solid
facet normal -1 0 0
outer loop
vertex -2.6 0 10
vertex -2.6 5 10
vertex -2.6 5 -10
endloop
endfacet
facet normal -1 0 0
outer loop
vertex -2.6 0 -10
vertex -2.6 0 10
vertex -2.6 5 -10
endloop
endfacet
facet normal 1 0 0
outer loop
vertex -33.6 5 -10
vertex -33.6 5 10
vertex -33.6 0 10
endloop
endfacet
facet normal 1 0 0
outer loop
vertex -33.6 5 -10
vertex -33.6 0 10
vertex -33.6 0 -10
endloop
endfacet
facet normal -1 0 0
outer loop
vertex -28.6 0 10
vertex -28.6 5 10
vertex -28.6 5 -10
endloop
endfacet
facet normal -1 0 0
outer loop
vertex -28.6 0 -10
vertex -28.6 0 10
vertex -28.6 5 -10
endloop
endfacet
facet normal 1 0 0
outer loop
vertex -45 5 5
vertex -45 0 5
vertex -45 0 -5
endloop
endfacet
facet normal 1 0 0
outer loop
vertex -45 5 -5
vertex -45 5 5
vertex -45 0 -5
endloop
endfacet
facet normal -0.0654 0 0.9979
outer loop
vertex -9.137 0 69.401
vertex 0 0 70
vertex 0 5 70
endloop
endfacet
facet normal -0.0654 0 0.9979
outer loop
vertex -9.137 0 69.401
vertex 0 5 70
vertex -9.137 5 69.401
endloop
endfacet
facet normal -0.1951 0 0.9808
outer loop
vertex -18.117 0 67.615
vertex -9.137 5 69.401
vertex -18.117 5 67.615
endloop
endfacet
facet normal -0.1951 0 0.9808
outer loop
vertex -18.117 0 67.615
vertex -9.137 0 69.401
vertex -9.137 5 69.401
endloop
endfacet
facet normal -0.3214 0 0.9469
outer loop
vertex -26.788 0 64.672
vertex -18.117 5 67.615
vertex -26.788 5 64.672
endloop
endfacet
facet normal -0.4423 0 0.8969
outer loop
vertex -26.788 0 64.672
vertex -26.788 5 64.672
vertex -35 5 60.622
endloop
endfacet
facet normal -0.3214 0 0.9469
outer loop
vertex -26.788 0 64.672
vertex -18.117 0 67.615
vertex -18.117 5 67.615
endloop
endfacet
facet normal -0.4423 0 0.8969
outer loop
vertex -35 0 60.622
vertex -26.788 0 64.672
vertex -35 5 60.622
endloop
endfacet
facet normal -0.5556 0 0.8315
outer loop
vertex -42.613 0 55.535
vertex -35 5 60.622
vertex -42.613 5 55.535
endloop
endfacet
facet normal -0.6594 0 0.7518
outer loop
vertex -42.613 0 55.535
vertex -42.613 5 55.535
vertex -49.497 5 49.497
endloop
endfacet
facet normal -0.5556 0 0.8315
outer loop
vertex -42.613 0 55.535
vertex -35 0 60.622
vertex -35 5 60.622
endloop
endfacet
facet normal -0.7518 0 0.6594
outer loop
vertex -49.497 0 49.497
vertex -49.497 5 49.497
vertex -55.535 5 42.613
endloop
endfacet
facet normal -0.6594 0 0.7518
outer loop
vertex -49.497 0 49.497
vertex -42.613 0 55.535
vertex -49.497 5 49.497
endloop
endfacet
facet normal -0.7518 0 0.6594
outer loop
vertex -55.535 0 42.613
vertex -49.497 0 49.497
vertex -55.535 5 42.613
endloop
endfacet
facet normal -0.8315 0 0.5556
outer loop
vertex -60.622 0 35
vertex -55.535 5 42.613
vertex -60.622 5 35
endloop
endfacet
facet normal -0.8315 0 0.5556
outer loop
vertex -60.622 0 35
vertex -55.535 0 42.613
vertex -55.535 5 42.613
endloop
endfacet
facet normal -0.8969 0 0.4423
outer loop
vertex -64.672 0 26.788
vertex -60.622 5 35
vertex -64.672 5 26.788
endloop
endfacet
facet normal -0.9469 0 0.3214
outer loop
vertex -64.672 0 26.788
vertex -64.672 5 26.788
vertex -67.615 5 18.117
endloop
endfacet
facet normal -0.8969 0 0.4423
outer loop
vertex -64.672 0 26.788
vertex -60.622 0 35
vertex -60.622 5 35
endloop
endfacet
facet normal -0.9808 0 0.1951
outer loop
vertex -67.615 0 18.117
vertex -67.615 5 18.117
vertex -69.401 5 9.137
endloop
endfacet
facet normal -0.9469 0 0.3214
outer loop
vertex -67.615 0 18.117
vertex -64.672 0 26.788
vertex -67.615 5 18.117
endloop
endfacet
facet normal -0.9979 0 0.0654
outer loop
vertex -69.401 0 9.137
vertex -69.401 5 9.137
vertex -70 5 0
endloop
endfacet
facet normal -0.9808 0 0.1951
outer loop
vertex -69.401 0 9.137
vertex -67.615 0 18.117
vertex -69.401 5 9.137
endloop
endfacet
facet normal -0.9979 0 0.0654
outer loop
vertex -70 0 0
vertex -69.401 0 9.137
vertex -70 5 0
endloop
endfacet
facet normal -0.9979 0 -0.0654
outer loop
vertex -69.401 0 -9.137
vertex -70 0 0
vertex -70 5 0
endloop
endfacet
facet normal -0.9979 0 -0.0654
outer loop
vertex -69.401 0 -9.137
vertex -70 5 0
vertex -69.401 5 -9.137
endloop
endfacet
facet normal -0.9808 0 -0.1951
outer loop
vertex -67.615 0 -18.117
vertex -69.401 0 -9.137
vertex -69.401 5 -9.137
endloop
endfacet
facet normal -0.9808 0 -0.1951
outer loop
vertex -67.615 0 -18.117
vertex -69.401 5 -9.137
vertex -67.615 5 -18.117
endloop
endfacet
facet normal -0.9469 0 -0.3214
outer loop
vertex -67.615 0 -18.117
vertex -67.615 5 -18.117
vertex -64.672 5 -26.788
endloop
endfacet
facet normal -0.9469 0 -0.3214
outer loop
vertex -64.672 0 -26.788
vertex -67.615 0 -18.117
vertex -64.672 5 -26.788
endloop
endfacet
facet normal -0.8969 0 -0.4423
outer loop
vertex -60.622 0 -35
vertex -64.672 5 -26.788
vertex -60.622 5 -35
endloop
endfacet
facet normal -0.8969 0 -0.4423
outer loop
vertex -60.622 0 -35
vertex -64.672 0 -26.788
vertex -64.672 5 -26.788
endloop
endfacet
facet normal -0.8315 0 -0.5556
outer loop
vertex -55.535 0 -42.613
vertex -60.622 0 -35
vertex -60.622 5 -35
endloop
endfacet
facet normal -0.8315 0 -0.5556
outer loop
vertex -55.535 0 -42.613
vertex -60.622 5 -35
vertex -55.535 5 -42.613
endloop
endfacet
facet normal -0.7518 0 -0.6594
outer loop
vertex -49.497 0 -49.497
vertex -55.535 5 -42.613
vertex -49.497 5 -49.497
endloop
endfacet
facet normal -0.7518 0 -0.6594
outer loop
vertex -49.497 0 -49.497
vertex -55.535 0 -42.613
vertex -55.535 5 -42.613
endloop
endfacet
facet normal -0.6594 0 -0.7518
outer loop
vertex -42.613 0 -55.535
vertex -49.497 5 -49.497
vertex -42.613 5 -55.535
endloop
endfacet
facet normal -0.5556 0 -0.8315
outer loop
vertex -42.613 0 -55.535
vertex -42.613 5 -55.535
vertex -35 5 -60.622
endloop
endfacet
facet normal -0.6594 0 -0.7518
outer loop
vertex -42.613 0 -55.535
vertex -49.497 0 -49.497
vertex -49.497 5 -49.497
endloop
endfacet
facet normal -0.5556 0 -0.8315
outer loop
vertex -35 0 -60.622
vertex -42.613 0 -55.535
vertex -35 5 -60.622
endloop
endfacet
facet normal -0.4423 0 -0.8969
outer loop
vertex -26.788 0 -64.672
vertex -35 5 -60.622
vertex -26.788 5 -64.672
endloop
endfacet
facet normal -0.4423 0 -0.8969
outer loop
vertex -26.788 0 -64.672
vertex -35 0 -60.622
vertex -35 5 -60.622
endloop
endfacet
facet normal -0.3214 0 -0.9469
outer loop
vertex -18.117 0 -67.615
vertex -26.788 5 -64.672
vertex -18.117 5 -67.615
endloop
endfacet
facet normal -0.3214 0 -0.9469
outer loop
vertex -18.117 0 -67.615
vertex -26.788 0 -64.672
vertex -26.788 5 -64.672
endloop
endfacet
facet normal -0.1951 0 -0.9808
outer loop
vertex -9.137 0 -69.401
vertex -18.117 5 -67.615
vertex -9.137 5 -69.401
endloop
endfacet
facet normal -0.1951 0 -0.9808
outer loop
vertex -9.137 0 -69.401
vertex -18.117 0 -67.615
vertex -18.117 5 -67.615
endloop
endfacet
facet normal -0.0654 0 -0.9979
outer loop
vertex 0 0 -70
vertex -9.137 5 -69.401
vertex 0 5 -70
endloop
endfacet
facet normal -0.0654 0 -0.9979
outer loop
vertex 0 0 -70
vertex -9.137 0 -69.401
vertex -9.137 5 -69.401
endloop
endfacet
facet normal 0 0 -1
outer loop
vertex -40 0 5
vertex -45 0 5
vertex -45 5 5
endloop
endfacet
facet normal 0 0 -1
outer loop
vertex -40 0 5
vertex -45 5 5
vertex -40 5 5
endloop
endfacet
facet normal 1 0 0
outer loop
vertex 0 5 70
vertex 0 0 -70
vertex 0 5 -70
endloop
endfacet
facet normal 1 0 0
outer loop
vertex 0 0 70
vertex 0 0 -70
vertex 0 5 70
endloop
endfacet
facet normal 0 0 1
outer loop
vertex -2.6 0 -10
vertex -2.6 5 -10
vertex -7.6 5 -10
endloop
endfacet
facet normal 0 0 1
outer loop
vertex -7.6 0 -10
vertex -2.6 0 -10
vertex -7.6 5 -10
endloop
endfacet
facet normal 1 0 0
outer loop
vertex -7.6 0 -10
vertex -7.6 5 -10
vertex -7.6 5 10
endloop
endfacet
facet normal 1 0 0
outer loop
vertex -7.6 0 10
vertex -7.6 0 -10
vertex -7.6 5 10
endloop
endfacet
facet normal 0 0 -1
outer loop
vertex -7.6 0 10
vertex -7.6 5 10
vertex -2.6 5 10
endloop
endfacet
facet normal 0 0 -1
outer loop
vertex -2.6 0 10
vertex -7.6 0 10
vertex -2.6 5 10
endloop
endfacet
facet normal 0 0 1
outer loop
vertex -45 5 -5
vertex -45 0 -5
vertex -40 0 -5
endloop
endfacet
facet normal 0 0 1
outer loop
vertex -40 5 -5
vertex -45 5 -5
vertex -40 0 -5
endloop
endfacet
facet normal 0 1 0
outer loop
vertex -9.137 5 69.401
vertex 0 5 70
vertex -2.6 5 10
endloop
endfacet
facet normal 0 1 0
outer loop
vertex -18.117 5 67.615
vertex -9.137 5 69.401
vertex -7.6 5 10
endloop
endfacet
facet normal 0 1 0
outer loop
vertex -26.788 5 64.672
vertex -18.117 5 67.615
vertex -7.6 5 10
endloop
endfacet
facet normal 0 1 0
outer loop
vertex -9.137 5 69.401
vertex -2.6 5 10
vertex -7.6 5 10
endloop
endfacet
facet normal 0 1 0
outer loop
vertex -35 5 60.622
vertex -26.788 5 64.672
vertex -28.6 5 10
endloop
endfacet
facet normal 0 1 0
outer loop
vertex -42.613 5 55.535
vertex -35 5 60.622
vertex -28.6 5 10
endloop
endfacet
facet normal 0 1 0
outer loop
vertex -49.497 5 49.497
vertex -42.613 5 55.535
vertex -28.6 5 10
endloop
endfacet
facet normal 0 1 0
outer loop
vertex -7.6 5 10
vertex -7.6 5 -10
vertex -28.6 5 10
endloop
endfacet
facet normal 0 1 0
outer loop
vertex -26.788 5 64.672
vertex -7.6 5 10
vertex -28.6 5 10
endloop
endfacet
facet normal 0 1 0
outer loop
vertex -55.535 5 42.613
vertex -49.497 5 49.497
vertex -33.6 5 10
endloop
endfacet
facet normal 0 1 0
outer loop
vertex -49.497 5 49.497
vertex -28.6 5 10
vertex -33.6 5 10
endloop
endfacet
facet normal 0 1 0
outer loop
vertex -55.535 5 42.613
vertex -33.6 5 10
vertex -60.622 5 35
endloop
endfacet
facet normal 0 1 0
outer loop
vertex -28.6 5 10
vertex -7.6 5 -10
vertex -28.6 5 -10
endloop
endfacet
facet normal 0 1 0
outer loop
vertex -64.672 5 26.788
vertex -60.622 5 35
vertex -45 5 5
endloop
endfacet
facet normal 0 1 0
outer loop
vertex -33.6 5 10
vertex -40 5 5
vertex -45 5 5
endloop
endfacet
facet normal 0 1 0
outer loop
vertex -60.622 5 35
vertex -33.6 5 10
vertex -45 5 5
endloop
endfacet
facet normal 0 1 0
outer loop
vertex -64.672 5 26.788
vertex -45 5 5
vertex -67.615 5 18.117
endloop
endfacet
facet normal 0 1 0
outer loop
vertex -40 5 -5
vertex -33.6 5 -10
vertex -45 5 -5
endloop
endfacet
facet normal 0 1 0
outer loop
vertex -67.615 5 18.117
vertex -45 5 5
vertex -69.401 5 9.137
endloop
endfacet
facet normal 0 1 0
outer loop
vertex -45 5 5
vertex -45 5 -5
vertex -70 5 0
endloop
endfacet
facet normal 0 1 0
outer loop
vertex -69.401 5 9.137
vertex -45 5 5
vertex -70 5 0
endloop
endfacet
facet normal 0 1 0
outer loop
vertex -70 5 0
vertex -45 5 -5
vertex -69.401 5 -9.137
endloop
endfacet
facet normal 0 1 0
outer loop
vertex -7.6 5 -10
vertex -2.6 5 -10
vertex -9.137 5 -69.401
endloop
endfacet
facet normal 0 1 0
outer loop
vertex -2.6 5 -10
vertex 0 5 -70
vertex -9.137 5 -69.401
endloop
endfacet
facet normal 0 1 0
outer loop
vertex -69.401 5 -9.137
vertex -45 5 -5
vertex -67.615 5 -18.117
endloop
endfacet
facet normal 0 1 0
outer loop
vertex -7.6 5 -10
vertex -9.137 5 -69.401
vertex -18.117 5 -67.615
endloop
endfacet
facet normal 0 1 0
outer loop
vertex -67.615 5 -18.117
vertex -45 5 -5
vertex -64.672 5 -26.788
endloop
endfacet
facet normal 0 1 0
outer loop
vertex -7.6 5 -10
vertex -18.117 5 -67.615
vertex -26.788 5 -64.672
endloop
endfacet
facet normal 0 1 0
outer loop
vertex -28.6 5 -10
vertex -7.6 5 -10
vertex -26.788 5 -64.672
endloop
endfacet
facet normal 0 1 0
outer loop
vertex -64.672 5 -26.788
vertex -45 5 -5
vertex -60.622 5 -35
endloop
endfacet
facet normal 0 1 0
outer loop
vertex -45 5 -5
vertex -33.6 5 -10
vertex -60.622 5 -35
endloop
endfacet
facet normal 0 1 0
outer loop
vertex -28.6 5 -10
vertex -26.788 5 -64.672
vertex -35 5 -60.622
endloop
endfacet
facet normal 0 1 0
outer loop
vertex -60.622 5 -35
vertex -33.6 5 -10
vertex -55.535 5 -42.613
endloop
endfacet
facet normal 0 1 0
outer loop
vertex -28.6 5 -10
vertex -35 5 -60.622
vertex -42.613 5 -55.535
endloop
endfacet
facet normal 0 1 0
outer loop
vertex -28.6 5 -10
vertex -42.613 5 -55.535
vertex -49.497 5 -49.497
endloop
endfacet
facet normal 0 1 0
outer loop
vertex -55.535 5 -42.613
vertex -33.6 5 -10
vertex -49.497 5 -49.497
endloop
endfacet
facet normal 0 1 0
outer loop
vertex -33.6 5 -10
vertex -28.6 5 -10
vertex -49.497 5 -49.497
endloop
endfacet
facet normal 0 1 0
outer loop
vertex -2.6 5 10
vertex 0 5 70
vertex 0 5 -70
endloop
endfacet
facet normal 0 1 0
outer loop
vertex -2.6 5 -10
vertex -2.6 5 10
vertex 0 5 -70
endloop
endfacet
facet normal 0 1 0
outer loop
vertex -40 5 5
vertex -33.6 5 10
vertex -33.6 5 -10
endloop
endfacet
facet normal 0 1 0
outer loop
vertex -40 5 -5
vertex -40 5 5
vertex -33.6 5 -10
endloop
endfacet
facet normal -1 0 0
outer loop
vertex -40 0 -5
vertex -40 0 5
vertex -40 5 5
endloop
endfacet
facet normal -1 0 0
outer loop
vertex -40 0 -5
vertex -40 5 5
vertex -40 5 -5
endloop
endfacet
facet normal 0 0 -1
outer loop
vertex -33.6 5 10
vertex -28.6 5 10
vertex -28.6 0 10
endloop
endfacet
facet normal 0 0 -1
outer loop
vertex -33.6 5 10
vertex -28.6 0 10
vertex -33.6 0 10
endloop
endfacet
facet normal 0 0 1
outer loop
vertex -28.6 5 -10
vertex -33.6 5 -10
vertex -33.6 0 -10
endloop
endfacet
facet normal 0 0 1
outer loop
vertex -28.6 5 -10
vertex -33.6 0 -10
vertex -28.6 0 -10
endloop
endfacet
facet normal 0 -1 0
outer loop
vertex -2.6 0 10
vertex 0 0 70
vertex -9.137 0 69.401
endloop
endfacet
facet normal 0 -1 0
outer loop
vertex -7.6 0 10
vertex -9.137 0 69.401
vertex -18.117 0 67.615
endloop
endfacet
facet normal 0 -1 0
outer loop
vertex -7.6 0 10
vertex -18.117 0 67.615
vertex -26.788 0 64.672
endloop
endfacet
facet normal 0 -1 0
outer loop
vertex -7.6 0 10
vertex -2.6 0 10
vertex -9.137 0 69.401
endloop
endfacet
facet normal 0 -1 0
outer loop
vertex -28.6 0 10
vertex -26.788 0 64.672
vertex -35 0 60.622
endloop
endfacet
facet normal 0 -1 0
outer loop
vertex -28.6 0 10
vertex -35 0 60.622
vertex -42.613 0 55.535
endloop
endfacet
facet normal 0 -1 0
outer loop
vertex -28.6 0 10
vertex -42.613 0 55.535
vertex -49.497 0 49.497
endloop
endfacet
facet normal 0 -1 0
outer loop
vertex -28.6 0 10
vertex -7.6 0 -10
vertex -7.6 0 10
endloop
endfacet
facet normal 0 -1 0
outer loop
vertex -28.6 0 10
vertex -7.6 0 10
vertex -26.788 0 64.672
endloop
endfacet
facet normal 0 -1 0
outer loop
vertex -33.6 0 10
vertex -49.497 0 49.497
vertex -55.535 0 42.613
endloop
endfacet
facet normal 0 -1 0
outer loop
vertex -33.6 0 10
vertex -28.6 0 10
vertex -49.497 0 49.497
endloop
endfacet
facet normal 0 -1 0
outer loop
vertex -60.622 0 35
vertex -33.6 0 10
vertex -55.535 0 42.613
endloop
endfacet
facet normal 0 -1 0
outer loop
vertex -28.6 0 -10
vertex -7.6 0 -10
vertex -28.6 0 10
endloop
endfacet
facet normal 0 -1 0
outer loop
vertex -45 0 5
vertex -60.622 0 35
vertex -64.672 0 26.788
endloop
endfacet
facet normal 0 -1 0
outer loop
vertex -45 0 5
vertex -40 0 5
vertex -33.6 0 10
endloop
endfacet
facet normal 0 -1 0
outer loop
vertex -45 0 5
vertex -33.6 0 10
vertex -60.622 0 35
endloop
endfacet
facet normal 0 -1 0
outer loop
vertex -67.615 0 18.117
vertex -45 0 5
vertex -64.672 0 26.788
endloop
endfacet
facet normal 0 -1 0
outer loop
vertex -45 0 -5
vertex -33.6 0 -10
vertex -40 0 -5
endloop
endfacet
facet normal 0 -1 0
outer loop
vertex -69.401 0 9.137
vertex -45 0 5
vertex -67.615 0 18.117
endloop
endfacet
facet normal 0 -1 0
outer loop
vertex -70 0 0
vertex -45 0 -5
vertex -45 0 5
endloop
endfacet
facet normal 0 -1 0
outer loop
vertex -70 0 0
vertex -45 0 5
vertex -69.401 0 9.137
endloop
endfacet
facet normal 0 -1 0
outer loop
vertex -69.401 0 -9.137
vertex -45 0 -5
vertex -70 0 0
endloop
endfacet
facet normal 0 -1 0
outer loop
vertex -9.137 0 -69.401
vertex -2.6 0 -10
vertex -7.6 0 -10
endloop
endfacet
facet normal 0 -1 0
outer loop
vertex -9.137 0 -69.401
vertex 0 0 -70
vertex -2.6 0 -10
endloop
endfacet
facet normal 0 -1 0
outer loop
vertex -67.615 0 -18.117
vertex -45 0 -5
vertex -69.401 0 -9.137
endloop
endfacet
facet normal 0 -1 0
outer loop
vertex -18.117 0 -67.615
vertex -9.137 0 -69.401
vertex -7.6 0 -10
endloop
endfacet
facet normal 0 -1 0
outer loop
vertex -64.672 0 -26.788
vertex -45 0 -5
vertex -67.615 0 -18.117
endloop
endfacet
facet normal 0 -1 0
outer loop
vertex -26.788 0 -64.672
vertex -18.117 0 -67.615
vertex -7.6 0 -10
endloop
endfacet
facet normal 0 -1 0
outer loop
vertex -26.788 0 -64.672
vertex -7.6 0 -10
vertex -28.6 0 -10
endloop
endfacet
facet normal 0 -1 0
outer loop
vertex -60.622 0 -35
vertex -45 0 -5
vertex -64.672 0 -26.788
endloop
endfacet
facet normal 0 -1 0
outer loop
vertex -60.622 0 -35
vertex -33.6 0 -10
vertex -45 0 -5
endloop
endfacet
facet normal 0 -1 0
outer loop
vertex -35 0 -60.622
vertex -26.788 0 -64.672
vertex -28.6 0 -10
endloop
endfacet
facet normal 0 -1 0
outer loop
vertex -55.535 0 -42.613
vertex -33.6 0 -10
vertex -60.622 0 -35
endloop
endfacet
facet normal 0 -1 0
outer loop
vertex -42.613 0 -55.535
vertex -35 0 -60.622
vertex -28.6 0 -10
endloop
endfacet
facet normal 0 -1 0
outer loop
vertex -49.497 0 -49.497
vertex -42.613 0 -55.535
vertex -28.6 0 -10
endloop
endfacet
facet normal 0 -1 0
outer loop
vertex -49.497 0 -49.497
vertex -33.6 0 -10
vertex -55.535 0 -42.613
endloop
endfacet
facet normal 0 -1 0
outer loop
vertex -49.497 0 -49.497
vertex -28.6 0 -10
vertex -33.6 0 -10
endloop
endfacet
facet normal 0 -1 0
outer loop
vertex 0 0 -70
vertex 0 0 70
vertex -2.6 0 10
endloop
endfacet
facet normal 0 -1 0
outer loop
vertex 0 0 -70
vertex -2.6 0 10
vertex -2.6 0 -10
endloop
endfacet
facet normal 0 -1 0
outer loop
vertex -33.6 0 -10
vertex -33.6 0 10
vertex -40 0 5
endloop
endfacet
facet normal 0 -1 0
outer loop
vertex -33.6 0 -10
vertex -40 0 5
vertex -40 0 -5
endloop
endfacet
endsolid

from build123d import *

# Parameters (mm, degrees)
SKETCH1_W           = 5
SKETCH1_H           = 10
BOSS_EXTRUDE1_DEPTH = 5
CUT_EXTRUDE1_DEPTH  = 10
CUT_EXTRUDE2_DEPTH  = 10


with BuildPart() as part:
    # Sketch1 → Boss-Extrude1 (new body)
    with BuildSketch(Plane(origin=(0, 0, 0), x_dir=(1, 0, 0), z_dir=(0, 1, 0))):
        with BuildLine():
            Line((0, 70), (0, -70))
            ThreePointArc((0, -70), (-70, 0), (0, 70))
        make_face()
        with Locations((-42.5, 0)):
            Rectangle(SKETCH1_W, SKETCH1_H, mode=Mode.SUBTRACT)
    extrude(amount=BOSS_EXTRUDE1_DEPTH)

    # Sketch2 → Cut-Extrude1 (cut)
    with BuildSketch(Plane(origin=(0, 5, 0), x_dir=(1, 0, 0), z_dir=(0, 1, 0))):
        Polygon((-7.6, -10), (-2.6, -10), (-2.6, 0), (-2.6, 10), (-7.6, 10), align=None)
    extrude(amount=-CUT_EXTRUDE1_DEPTH, mode=Mode.SUBTRACT)

    # Sketch3 → Cut-Extrude2 (cut)
    with BuildSketch(Plane(origin=(0, 5, 0), x_dir=(1, 0, 0), z_dir=(0, 1, 0))):
        Polygon((-28.6, 0), (-28.6, -10), (-33.6, -10), (-33.6, 10), (-28.6, 10), align=None)
    extrude(amount=-CUT_EXTRUDE2_DEPTH, mode=Mode.SUBTRACT)


solid = part.part
